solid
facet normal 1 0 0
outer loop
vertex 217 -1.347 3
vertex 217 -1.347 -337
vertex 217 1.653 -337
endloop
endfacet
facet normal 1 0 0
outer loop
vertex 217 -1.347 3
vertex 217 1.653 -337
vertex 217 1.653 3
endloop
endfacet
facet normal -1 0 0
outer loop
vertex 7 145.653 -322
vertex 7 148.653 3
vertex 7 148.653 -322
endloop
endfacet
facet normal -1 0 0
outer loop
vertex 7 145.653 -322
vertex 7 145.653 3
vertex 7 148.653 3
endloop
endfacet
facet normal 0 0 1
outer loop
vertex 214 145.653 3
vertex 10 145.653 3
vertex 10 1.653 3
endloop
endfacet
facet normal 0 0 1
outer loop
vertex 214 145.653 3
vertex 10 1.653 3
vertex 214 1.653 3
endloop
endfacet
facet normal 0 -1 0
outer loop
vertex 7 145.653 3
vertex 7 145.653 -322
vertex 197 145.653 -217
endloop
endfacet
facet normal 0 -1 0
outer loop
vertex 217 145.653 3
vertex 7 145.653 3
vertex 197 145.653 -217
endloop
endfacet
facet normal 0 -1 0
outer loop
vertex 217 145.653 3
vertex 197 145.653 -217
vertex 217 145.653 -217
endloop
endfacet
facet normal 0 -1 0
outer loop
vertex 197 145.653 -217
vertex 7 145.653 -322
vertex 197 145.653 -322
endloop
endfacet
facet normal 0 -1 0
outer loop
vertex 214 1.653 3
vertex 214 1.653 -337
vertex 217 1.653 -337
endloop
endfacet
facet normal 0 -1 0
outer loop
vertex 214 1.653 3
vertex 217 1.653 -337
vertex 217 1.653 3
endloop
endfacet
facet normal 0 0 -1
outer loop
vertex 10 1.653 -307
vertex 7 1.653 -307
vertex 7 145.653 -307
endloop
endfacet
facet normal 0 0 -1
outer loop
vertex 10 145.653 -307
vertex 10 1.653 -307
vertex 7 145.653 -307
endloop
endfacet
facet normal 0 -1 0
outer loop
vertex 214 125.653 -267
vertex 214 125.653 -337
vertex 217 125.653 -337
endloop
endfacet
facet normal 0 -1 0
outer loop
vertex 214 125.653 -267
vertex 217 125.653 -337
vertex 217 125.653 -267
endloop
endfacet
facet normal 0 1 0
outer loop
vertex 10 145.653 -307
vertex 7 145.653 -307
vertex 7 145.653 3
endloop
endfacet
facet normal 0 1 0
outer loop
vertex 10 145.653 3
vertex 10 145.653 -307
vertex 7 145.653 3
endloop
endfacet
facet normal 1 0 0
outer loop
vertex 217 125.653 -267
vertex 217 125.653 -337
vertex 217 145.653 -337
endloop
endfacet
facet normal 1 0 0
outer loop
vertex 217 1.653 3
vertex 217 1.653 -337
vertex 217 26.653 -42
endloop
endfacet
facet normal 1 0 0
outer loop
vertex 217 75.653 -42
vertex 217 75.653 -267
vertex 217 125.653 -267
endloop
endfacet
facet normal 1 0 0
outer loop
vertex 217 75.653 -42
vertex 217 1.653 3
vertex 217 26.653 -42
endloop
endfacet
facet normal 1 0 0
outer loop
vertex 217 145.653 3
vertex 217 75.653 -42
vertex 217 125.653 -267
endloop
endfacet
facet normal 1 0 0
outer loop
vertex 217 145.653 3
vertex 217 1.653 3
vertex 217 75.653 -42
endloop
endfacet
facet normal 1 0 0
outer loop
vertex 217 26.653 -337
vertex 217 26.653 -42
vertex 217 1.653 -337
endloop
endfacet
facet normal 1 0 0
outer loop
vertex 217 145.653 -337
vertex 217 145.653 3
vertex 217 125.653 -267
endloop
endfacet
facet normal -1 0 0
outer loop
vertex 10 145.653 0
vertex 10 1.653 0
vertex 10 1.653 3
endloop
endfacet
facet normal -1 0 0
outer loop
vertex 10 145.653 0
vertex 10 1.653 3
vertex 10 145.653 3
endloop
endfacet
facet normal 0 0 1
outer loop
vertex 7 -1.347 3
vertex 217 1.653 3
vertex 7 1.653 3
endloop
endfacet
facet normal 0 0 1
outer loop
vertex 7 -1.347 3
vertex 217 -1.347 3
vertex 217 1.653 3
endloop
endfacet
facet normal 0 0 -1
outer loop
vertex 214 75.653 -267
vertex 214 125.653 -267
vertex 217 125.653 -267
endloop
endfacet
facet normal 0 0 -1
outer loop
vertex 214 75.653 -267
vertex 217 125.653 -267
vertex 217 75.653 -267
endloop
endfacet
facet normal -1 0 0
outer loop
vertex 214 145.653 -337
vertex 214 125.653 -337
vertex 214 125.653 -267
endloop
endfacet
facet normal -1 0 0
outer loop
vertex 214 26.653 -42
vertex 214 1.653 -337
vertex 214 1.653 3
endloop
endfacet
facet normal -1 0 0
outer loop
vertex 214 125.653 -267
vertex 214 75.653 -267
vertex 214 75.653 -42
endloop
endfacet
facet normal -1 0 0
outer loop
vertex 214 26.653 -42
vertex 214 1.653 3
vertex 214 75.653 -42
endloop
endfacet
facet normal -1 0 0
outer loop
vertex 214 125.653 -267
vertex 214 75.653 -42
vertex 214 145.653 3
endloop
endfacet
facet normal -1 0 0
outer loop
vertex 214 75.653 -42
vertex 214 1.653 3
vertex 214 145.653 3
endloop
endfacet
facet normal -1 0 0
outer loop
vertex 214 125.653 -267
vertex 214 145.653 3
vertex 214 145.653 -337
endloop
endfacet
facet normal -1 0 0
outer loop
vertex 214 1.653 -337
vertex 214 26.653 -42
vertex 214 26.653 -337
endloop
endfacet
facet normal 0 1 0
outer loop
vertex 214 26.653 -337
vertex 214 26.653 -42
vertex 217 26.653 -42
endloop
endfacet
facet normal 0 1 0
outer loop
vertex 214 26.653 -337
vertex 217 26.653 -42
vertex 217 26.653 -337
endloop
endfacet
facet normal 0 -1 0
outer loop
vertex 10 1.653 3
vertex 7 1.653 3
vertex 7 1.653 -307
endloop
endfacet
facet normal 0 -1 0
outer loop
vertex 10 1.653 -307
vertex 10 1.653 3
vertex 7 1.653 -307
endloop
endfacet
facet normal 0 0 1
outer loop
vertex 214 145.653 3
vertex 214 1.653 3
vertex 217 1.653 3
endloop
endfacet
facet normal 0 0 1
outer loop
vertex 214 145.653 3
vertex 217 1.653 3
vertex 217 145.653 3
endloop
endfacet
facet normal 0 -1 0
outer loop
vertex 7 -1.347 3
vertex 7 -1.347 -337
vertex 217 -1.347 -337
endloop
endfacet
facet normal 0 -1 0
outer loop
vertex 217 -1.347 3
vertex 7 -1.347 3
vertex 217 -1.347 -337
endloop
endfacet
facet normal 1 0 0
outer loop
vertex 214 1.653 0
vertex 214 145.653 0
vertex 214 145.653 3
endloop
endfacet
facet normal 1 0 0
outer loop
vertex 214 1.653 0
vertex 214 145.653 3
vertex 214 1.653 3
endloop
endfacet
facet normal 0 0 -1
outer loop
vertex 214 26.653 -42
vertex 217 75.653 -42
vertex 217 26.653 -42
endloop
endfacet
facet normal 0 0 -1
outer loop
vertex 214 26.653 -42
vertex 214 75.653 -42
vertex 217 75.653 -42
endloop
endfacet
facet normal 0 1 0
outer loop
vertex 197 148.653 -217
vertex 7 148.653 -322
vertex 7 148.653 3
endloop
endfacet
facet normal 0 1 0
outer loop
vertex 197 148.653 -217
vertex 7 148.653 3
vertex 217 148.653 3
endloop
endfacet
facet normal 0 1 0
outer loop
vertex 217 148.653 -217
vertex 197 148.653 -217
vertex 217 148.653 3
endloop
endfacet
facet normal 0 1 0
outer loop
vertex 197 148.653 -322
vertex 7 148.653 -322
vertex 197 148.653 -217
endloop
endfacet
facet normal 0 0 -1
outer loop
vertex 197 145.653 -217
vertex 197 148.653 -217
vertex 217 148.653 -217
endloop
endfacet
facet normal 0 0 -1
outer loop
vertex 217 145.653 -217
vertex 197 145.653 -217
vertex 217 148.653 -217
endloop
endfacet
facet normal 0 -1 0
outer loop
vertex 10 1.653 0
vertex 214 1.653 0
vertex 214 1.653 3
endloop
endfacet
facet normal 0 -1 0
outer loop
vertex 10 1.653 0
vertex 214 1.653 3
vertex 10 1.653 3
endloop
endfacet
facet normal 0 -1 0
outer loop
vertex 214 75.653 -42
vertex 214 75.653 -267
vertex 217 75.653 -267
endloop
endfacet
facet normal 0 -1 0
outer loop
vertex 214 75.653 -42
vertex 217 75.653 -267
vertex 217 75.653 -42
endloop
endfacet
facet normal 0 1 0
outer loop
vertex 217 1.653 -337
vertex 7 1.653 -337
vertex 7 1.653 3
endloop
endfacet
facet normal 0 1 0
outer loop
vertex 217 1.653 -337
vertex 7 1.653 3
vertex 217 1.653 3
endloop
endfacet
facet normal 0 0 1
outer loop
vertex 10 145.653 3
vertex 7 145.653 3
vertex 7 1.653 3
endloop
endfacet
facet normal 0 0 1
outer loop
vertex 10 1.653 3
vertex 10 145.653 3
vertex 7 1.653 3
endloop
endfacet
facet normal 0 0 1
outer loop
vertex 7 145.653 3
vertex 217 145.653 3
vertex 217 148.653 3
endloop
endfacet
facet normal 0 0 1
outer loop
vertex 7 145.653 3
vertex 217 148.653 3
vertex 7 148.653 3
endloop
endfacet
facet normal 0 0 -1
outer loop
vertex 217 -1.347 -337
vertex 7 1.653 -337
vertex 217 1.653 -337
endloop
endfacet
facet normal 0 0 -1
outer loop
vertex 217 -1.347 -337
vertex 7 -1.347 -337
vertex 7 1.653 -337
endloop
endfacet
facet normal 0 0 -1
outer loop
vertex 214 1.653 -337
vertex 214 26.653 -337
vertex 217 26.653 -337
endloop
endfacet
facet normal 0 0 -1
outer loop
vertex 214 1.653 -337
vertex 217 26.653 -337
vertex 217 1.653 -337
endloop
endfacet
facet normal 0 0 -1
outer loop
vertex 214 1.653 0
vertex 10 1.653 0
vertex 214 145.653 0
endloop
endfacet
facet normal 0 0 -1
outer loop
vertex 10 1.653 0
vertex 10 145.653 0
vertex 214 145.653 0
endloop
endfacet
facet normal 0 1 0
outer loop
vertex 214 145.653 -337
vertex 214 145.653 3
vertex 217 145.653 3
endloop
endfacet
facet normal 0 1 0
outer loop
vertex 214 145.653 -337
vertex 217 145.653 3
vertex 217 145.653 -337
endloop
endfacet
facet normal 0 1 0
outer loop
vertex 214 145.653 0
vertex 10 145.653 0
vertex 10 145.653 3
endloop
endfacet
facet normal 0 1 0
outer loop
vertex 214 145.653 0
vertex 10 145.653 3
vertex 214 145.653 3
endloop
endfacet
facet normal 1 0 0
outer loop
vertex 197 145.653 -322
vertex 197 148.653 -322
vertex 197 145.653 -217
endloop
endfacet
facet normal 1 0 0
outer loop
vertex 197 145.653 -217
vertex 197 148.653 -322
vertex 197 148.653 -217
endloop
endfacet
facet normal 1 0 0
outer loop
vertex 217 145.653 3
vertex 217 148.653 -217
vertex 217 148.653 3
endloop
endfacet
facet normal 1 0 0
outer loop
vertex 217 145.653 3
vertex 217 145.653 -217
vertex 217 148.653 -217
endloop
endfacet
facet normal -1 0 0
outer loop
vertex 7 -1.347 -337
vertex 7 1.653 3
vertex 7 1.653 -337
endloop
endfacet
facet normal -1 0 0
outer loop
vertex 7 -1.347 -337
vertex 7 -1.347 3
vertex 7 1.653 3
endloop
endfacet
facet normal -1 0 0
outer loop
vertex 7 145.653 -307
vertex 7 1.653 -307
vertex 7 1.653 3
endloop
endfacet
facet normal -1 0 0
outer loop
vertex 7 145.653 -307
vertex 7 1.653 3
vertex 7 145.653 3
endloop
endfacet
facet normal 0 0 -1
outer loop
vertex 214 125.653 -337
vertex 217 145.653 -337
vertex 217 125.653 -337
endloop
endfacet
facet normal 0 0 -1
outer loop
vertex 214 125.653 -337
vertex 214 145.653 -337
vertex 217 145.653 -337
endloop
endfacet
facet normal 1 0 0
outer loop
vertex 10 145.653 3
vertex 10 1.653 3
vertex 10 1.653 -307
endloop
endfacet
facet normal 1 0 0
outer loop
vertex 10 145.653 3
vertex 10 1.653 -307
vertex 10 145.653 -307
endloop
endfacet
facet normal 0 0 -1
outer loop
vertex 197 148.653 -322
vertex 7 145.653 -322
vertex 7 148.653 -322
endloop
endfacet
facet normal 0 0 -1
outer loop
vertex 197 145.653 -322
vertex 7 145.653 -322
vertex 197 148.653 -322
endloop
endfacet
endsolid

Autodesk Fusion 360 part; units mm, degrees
sketch "Sketch1" plane through (0, 0, 0) normal (0, 1, 0) x (1, 0, 0) in component "Back"
  line L0 (0, 0) -> (210, 0)
  line L1 (210, 0) -> (210, -340)
  line L2 (210, -340) -> (0, -340)
  line L3 (0, -340) -> (0, 0)
  dimension "d1" = 210
  dimension "d2" = 340
extrude "Extrude1" add sketch "Sketch1" along normal blind 3 makes body 1 in component "Back"
sketch "Sketch1 (2)" plane through (0, 0, 0) normal (1, 0, 0) x (0, 1, 0) in component "right side"
  line L0 (2.986, 0.2323) -> (146.986, 0.2323)
  line L1 (146.986, 0.2323) -> (146.986, 310.2323)
  line L2 (146.986, 310.2323) -> (2.986, 310.2323)
  line L3 (2.986, 310.2323) -> (2.986, 0.2323)
  dimension "d5" = 310
  dimension "d6" = 144
extrude "Extrude1'" add sketch "Sketch1 (2)" along normal blind 3 separate body makes body 2 in component "right side"
sketch "Sketch1 (3)" plane through (0, 0, 0) normal (0, 0, 1) x (1, 0, 0) in component "top"
  line L0 (10, 145.6527) -> (214, 145.6527)
  line L1 (214, 145.6527) -> (214, 1.6527)
  line L2 (214, 1.6527) -> (10, 1.6527)
  line L3 (10, 1.6527) -> (10, 145.6527)
  dimension "d13" = 204
  dimension "d14" = 144
extrude "Extrude1''" add sketch "Sketch1 (3)" along normal blind 3 separate body makes body 3 in component "top"
sketch "Sketch1 (4)" plane through (0, 0, 0) normal (0, 1, 0) x (1, 0, 0) in component "front"
  line L0 (116.0218, -155.6494) -> (-93.9782, -155.6494)
  line L1 (-93.9782, -155.6494) -> (-93.9782, 169.3506)
  line L2 (-93.9782, 169.3506) -> (116.0218, 169.3506)
  line L3 (116.0218, 169.3506) -> (116.0218, -155.6494)
  dimension "d21" = 210
  dimension "d22" = 325
extrude "Extrude1'''" add sketch "Sketch1 (4)" along normal blind 3 separate body makes body 4 in component "front"
sketch "Sketch2" plane through (0, 0, 0) normal (1, 0, 0) x (0, 1, 0) in component "front"
sketch "Sketch1 (5)" plane through (0, 0, 0) normal (1, 0, 0) x (0, 1, 0) in component "left side"
  line L0 (-324, 340) -> (-180, 340)
  line L1 (-180, 340) -> (-180, 0)
  line L2 (-180, 0) -> (-200, 0)
  line L3 (-200, 0) -> (-200, 70)
  line L4 (-200, 70) -> (-250, 70)
  line L5 (-250, 70) -> (-250, 295)
  line L6 (-250, 295) -> (-299, 295)
  line L7 (-299, 295) -> (-299, 0)
  line L8 (-299, 0) -> (-324, 0)
  line L9 (-324, 0) -> (-324, 340)
  dimension "d29" = 144
  dimension "d30" = 340
  dimension "d31" = 295
  dimension "d32" = 25
  dimension "d33" = 20
  dimension "d34" = 70
extrude "Extrude1''''" add sketch "Sketch1 (5)" along normal blind 3 separate body makes body 5 in component "left side"
sketch "Sketch1 (6)" plane through (0, 0, 0) normal (0, 1, 0) x (1, 0, 0)
sketch "Sketch3" plane through (0, 3, 0) normal (0, 1, 0) x (-1, 0, 0) in component "front"
  line L0 (-116.0218, -169.3506) -> (93.9782, -169.3506)
  line L1 (93.9782, -169.3506) -> (93.9782, 155.6494)
  line L2 (93.9782, 155.6494) -> (-116.0218, 155.6494)
  line L3 (-116.0218, 155.6494) -> (-116.0218, -169.3506)
  line L4 (-116.0218, -169.3506) -> (-96.0218, -169.3506)
  line L5 (-96.0218, -169.3506) -> (-96.0218, -64.3506)
  line L6 (-96.0218, -64.3506) -> (-116.0218, -64.3506)
  line L7 (-116.0218, -64.3506) -> (-116.0218, -169.3506)
  dimension "d41" = 20
  dimension "d42" = 105
extrude "Extrude2" cut sketch "Sketch3" against normal blind 3 contours L0 L3 L4 L5 L6 L7 bodies 4 in component "front"
component "Back" placed x (1, 0, 0) y (0, 1, 0) z (0, 0, 1) at (7, -1.3473, -337)
component "right side" placed x (1, 0, 0) y (0, 1, 0) z (0, 0, 1) at (7, -1.3333, -307.2323)
component "top" placed x (1, 0, 0) y (0, 1, 0) z (0, 0, 1) at (0, 0, 0)
component "front" placed x (1, 0, 0) y (0, 1, 0) z (0, 0, 1) at (100.9782, 145.6527, -152.6494)
component "left side" placed x (1, 0, 0) y (0, 1, 0) z (0, 0, 1) at (214, 325.6527, -337)
